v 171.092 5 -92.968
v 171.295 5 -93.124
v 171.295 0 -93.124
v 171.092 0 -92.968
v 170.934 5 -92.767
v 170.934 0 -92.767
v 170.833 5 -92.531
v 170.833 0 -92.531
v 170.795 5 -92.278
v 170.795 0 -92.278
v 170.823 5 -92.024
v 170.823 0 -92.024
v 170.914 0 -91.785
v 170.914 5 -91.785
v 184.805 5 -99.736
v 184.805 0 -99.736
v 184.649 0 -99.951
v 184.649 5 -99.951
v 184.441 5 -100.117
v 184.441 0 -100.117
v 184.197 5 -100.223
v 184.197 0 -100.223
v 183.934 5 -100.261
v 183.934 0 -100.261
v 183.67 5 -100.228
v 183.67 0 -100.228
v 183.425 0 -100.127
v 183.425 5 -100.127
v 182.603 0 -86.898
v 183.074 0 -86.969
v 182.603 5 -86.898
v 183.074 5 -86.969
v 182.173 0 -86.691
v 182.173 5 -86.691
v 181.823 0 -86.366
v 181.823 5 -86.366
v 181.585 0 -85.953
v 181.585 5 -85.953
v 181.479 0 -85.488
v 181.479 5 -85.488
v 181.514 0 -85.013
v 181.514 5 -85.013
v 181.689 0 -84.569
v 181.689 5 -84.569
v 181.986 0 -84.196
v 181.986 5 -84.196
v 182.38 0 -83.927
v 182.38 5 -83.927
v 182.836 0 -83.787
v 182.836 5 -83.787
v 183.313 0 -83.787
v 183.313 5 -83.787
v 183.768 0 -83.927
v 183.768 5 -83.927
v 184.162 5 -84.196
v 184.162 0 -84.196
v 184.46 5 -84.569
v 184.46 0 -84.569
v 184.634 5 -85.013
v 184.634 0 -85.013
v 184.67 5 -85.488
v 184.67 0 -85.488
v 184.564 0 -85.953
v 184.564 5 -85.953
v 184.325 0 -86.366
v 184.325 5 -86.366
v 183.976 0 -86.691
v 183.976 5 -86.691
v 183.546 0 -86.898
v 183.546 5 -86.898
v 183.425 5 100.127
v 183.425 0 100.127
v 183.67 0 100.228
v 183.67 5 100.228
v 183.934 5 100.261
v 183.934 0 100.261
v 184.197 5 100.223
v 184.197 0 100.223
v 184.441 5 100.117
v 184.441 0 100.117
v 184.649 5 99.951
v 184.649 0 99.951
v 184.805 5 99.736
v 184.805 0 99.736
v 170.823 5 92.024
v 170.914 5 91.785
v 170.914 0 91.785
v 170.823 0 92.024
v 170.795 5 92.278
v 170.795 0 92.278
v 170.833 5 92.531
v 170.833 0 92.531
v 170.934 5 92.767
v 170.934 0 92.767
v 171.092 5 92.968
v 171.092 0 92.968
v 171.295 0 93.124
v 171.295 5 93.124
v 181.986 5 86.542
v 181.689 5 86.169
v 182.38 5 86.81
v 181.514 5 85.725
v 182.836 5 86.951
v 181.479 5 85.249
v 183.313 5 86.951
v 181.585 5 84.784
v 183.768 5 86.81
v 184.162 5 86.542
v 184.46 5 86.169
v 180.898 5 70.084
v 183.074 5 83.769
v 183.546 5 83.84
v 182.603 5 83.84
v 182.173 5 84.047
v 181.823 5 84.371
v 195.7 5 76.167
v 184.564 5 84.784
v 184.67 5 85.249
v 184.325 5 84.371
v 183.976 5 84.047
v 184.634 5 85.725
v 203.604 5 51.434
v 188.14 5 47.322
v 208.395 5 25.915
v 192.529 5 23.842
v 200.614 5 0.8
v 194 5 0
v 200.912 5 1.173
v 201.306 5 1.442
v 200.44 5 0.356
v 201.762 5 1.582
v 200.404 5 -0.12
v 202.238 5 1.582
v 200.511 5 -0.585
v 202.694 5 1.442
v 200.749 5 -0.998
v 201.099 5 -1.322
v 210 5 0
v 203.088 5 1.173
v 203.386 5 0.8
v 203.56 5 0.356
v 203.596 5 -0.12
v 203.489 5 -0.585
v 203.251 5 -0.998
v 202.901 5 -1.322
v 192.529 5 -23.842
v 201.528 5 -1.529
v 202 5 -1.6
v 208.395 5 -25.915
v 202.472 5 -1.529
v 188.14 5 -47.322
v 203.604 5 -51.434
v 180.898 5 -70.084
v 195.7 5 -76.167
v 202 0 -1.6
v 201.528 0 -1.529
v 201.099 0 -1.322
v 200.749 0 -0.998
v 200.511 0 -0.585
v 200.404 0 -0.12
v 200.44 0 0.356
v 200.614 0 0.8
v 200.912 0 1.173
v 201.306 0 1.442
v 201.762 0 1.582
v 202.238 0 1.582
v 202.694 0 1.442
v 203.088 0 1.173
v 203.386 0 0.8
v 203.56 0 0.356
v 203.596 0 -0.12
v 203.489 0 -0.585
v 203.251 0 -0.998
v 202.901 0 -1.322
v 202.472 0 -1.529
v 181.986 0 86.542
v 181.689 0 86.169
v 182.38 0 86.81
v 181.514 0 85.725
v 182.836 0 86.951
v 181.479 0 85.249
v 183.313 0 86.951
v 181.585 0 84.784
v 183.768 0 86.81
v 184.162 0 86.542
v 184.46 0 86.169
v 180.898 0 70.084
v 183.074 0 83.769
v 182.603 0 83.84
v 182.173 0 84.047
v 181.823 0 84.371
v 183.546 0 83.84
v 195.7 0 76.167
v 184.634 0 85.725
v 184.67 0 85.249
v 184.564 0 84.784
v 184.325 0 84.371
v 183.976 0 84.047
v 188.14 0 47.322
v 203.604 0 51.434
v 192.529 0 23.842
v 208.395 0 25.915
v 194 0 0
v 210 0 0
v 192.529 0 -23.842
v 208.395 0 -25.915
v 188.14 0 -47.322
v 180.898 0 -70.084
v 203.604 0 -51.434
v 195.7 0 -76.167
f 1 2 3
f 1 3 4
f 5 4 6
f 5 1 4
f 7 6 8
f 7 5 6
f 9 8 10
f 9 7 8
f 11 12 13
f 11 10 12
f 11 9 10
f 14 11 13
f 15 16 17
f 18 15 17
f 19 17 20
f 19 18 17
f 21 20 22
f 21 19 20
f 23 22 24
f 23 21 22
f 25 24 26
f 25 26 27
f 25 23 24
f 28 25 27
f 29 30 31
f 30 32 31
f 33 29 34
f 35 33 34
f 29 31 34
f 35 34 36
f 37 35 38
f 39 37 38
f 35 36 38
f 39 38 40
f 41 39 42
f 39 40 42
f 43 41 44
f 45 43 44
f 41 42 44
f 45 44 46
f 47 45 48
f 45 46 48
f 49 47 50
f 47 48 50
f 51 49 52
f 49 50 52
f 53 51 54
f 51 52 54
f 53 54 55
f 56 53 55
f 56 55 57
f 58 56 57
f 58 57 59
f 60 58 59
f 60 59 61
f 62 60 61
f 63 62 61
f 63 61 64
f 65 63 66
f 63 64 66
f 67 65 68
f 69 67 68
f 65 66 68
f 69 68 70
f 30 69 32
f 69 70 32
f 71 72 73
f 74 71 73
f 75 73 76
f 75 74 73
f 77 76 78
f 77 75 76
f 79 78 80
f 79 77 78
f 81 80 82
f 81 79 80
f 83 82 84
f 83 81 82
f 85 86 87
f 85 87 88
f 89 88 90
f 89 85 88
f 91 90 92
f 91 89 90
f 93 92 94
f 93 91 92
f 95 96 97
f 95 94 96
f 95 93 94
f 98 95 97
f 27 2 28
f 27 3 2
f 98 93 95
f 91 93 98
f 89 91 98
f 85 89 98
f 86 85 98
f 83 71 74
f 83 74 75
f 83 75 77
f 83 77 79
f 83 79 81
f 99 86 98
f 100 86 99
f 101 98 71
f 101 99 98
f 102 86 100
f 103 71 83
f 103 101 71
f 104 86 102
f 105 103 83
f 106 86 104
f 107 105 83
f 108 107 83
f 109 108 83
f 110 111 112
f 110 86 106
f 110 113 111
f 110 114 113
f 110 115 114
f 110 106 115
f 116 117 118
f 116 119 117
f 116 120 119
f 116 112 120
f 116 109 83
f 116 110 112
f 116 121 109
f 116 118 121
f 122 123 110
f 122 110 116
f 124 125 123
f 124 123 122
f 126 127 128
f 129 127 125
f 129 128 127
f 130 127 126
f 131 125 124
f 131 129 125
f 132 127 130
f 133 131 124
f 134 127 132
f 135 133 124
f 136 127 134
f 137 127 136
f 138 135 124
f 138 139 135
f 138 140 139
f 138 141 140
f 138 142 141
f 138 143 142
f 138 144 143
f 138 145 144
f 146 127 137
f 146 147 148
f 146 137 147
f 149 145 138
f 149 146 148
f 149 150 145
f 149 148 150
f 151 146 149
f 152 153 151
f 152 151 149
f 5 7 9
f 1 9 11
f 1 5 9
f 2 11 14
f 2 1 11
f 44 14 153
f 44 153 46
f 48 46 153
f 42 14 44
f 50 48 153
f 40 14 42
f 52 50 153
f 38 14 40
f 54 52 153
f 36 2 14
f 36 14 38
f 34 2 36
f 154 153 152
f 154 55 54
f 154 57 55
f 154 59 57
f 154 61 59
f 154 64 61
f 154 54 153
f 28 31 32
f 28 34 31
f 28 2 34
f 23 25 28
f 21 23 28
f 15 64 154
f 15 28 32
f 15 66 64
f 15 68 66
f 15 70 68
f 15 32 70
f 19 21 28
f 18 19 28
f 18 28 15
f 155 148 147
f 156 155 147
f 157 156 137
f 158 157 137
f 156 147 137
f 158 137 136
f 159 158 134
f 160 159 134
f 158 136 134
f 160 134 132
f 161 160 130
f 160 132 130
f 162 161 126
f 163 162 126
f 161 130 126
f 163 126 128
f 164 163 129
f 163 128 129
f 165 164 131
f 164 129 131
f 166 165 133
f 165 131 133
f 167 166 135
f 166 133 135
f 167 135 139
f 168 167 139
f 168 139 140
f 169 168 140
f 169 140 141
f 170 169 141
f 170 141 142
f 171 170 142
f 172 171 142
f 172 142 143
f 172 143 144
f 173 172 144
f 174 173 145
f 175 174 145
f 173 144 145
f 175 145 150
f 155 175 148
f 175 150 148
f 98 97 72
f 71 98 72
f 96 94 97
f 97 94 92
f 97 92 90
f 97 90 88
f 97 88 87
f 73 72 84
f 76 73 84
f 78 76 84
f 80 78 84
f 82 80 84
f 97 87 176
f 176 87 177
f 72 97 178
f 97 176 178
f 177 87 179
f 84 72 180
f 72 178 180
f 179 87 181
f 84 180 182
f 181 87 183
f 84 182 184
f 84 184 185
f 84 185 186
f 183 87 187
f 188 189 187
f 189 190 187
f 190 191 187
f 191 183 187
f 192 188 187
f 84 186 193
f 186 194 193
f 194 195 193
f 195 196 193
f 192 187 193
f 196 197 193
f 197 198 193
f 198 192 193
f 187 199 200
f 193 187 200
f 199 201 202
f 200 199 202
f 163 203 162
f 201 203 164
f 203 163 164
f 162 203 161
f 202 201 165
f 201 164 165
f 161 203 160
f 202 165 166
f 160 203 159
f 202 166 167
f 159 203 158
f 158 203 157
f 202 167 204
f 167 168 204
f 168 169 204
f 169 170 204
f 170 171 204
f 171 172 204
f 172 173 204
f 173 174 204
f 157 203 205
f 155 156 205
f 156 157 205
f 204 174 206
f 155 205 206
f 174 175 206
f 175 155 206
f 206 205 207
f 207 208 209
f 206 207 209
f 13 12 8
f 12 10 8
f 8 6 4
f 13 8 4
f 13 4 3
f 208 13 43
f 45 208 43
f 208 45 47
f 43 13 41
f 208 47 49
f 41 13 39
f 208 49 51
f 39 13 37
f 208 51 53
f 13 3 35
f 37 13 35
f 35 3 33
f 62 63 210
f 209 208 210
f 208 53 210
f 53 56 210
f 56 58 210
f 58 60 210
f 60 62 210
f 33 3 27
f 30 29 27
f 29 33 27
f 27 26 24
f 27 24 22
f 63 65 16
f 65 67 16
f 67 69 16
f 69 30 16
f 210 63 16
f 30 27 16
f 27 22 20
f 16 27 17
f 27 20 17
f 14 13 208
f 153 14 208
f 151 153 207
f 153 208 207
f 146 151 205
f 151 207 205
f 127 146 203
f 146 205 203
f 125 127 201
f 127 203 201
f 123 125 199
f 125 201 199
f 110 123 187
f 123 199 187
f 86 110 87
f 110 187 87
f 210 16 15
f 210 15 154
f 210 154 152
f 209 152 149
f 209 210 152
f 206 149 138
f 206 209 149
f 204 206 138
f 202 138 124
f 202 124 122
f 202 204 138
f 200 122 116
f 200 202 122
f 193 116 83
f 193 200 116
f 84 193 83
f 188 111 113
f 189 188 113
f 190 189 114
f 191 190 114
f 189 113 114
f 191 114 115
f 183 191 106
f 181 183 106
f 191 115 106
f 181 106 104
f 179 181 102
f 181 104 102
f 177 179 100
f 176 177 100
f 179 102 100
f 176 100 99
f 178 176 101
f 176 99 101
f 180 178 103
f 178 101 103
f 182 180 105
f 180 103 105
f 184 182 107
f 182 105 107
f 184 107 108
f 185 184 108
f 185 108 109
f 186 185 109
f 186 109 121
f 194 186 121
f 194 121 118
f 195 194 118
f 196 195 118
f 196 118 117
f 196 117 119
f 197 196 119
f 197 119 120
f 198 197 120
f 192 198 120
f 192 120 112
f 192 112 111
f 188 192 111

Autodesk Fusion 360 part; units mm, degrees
sketch "スケッチ1" plane through (0, 0, 0) normal (0, 1, 0) x (1, 0, 0)
  arc A0 (181.8653, -105) -> (181.8653, 105) centre (0, 0) ccw
  line L0 (181.8653, 105) -> (0, 0)
  line L1 (0, 0) -> (181.8653, -105)
  line L2 (0, 0) -> (210, 0)
  arc A1 (168.0089, -97) -> (168.0089, 97) centre (0, 0) ccw
  line L3 (10, 0) -> (184.3138, 100.6401)
  line L4 (10, 0) -> (184.3138, -100.6401)
  arc A2 (183.0742, -85.3689) -> (183.0742, 85.3689) centre (0, 0) ccw
  line L5 (0, 0) -> (183.0742, 85.3689)
  line L6 (0, 0) -> (183.0742, -85.3689)
  point P0 (202, 0)
  dimension "d1" = 210
  dimension "d2" = 30
  dimension "d3" = 30
  dimension "d4" = 194
  dimension "d14" = 30
  dimension "d15" = 10
  dimension "d17" = 30
  dimension "d23" = 202
  dimension "d24" = 25
  dimension "d25" = 25
extrude "押し出し1" add sketch "スケッチ1" along normal blind 5 contours A0 L2 A1 L4 A2 L6 | A0 L2 A1 L3 A2 L5 | L2 A1 A2 L6 | L2 A1 A2 L5
hole "穴1" at (183.0742, 0, 85.3689) at (202, 0, 0) at (183.0742, 0, -85.3689) direction (0, 1, 0) diameter 3.2 end through all
fillet "フィレット1" radius 1 4 edges at (184.3138, 2.5, 100.6401) (184.3138, 2.5, -100.6401) (170.4531, 2.5, 92.6377) (170.4531, 2.5, -92.6377)
